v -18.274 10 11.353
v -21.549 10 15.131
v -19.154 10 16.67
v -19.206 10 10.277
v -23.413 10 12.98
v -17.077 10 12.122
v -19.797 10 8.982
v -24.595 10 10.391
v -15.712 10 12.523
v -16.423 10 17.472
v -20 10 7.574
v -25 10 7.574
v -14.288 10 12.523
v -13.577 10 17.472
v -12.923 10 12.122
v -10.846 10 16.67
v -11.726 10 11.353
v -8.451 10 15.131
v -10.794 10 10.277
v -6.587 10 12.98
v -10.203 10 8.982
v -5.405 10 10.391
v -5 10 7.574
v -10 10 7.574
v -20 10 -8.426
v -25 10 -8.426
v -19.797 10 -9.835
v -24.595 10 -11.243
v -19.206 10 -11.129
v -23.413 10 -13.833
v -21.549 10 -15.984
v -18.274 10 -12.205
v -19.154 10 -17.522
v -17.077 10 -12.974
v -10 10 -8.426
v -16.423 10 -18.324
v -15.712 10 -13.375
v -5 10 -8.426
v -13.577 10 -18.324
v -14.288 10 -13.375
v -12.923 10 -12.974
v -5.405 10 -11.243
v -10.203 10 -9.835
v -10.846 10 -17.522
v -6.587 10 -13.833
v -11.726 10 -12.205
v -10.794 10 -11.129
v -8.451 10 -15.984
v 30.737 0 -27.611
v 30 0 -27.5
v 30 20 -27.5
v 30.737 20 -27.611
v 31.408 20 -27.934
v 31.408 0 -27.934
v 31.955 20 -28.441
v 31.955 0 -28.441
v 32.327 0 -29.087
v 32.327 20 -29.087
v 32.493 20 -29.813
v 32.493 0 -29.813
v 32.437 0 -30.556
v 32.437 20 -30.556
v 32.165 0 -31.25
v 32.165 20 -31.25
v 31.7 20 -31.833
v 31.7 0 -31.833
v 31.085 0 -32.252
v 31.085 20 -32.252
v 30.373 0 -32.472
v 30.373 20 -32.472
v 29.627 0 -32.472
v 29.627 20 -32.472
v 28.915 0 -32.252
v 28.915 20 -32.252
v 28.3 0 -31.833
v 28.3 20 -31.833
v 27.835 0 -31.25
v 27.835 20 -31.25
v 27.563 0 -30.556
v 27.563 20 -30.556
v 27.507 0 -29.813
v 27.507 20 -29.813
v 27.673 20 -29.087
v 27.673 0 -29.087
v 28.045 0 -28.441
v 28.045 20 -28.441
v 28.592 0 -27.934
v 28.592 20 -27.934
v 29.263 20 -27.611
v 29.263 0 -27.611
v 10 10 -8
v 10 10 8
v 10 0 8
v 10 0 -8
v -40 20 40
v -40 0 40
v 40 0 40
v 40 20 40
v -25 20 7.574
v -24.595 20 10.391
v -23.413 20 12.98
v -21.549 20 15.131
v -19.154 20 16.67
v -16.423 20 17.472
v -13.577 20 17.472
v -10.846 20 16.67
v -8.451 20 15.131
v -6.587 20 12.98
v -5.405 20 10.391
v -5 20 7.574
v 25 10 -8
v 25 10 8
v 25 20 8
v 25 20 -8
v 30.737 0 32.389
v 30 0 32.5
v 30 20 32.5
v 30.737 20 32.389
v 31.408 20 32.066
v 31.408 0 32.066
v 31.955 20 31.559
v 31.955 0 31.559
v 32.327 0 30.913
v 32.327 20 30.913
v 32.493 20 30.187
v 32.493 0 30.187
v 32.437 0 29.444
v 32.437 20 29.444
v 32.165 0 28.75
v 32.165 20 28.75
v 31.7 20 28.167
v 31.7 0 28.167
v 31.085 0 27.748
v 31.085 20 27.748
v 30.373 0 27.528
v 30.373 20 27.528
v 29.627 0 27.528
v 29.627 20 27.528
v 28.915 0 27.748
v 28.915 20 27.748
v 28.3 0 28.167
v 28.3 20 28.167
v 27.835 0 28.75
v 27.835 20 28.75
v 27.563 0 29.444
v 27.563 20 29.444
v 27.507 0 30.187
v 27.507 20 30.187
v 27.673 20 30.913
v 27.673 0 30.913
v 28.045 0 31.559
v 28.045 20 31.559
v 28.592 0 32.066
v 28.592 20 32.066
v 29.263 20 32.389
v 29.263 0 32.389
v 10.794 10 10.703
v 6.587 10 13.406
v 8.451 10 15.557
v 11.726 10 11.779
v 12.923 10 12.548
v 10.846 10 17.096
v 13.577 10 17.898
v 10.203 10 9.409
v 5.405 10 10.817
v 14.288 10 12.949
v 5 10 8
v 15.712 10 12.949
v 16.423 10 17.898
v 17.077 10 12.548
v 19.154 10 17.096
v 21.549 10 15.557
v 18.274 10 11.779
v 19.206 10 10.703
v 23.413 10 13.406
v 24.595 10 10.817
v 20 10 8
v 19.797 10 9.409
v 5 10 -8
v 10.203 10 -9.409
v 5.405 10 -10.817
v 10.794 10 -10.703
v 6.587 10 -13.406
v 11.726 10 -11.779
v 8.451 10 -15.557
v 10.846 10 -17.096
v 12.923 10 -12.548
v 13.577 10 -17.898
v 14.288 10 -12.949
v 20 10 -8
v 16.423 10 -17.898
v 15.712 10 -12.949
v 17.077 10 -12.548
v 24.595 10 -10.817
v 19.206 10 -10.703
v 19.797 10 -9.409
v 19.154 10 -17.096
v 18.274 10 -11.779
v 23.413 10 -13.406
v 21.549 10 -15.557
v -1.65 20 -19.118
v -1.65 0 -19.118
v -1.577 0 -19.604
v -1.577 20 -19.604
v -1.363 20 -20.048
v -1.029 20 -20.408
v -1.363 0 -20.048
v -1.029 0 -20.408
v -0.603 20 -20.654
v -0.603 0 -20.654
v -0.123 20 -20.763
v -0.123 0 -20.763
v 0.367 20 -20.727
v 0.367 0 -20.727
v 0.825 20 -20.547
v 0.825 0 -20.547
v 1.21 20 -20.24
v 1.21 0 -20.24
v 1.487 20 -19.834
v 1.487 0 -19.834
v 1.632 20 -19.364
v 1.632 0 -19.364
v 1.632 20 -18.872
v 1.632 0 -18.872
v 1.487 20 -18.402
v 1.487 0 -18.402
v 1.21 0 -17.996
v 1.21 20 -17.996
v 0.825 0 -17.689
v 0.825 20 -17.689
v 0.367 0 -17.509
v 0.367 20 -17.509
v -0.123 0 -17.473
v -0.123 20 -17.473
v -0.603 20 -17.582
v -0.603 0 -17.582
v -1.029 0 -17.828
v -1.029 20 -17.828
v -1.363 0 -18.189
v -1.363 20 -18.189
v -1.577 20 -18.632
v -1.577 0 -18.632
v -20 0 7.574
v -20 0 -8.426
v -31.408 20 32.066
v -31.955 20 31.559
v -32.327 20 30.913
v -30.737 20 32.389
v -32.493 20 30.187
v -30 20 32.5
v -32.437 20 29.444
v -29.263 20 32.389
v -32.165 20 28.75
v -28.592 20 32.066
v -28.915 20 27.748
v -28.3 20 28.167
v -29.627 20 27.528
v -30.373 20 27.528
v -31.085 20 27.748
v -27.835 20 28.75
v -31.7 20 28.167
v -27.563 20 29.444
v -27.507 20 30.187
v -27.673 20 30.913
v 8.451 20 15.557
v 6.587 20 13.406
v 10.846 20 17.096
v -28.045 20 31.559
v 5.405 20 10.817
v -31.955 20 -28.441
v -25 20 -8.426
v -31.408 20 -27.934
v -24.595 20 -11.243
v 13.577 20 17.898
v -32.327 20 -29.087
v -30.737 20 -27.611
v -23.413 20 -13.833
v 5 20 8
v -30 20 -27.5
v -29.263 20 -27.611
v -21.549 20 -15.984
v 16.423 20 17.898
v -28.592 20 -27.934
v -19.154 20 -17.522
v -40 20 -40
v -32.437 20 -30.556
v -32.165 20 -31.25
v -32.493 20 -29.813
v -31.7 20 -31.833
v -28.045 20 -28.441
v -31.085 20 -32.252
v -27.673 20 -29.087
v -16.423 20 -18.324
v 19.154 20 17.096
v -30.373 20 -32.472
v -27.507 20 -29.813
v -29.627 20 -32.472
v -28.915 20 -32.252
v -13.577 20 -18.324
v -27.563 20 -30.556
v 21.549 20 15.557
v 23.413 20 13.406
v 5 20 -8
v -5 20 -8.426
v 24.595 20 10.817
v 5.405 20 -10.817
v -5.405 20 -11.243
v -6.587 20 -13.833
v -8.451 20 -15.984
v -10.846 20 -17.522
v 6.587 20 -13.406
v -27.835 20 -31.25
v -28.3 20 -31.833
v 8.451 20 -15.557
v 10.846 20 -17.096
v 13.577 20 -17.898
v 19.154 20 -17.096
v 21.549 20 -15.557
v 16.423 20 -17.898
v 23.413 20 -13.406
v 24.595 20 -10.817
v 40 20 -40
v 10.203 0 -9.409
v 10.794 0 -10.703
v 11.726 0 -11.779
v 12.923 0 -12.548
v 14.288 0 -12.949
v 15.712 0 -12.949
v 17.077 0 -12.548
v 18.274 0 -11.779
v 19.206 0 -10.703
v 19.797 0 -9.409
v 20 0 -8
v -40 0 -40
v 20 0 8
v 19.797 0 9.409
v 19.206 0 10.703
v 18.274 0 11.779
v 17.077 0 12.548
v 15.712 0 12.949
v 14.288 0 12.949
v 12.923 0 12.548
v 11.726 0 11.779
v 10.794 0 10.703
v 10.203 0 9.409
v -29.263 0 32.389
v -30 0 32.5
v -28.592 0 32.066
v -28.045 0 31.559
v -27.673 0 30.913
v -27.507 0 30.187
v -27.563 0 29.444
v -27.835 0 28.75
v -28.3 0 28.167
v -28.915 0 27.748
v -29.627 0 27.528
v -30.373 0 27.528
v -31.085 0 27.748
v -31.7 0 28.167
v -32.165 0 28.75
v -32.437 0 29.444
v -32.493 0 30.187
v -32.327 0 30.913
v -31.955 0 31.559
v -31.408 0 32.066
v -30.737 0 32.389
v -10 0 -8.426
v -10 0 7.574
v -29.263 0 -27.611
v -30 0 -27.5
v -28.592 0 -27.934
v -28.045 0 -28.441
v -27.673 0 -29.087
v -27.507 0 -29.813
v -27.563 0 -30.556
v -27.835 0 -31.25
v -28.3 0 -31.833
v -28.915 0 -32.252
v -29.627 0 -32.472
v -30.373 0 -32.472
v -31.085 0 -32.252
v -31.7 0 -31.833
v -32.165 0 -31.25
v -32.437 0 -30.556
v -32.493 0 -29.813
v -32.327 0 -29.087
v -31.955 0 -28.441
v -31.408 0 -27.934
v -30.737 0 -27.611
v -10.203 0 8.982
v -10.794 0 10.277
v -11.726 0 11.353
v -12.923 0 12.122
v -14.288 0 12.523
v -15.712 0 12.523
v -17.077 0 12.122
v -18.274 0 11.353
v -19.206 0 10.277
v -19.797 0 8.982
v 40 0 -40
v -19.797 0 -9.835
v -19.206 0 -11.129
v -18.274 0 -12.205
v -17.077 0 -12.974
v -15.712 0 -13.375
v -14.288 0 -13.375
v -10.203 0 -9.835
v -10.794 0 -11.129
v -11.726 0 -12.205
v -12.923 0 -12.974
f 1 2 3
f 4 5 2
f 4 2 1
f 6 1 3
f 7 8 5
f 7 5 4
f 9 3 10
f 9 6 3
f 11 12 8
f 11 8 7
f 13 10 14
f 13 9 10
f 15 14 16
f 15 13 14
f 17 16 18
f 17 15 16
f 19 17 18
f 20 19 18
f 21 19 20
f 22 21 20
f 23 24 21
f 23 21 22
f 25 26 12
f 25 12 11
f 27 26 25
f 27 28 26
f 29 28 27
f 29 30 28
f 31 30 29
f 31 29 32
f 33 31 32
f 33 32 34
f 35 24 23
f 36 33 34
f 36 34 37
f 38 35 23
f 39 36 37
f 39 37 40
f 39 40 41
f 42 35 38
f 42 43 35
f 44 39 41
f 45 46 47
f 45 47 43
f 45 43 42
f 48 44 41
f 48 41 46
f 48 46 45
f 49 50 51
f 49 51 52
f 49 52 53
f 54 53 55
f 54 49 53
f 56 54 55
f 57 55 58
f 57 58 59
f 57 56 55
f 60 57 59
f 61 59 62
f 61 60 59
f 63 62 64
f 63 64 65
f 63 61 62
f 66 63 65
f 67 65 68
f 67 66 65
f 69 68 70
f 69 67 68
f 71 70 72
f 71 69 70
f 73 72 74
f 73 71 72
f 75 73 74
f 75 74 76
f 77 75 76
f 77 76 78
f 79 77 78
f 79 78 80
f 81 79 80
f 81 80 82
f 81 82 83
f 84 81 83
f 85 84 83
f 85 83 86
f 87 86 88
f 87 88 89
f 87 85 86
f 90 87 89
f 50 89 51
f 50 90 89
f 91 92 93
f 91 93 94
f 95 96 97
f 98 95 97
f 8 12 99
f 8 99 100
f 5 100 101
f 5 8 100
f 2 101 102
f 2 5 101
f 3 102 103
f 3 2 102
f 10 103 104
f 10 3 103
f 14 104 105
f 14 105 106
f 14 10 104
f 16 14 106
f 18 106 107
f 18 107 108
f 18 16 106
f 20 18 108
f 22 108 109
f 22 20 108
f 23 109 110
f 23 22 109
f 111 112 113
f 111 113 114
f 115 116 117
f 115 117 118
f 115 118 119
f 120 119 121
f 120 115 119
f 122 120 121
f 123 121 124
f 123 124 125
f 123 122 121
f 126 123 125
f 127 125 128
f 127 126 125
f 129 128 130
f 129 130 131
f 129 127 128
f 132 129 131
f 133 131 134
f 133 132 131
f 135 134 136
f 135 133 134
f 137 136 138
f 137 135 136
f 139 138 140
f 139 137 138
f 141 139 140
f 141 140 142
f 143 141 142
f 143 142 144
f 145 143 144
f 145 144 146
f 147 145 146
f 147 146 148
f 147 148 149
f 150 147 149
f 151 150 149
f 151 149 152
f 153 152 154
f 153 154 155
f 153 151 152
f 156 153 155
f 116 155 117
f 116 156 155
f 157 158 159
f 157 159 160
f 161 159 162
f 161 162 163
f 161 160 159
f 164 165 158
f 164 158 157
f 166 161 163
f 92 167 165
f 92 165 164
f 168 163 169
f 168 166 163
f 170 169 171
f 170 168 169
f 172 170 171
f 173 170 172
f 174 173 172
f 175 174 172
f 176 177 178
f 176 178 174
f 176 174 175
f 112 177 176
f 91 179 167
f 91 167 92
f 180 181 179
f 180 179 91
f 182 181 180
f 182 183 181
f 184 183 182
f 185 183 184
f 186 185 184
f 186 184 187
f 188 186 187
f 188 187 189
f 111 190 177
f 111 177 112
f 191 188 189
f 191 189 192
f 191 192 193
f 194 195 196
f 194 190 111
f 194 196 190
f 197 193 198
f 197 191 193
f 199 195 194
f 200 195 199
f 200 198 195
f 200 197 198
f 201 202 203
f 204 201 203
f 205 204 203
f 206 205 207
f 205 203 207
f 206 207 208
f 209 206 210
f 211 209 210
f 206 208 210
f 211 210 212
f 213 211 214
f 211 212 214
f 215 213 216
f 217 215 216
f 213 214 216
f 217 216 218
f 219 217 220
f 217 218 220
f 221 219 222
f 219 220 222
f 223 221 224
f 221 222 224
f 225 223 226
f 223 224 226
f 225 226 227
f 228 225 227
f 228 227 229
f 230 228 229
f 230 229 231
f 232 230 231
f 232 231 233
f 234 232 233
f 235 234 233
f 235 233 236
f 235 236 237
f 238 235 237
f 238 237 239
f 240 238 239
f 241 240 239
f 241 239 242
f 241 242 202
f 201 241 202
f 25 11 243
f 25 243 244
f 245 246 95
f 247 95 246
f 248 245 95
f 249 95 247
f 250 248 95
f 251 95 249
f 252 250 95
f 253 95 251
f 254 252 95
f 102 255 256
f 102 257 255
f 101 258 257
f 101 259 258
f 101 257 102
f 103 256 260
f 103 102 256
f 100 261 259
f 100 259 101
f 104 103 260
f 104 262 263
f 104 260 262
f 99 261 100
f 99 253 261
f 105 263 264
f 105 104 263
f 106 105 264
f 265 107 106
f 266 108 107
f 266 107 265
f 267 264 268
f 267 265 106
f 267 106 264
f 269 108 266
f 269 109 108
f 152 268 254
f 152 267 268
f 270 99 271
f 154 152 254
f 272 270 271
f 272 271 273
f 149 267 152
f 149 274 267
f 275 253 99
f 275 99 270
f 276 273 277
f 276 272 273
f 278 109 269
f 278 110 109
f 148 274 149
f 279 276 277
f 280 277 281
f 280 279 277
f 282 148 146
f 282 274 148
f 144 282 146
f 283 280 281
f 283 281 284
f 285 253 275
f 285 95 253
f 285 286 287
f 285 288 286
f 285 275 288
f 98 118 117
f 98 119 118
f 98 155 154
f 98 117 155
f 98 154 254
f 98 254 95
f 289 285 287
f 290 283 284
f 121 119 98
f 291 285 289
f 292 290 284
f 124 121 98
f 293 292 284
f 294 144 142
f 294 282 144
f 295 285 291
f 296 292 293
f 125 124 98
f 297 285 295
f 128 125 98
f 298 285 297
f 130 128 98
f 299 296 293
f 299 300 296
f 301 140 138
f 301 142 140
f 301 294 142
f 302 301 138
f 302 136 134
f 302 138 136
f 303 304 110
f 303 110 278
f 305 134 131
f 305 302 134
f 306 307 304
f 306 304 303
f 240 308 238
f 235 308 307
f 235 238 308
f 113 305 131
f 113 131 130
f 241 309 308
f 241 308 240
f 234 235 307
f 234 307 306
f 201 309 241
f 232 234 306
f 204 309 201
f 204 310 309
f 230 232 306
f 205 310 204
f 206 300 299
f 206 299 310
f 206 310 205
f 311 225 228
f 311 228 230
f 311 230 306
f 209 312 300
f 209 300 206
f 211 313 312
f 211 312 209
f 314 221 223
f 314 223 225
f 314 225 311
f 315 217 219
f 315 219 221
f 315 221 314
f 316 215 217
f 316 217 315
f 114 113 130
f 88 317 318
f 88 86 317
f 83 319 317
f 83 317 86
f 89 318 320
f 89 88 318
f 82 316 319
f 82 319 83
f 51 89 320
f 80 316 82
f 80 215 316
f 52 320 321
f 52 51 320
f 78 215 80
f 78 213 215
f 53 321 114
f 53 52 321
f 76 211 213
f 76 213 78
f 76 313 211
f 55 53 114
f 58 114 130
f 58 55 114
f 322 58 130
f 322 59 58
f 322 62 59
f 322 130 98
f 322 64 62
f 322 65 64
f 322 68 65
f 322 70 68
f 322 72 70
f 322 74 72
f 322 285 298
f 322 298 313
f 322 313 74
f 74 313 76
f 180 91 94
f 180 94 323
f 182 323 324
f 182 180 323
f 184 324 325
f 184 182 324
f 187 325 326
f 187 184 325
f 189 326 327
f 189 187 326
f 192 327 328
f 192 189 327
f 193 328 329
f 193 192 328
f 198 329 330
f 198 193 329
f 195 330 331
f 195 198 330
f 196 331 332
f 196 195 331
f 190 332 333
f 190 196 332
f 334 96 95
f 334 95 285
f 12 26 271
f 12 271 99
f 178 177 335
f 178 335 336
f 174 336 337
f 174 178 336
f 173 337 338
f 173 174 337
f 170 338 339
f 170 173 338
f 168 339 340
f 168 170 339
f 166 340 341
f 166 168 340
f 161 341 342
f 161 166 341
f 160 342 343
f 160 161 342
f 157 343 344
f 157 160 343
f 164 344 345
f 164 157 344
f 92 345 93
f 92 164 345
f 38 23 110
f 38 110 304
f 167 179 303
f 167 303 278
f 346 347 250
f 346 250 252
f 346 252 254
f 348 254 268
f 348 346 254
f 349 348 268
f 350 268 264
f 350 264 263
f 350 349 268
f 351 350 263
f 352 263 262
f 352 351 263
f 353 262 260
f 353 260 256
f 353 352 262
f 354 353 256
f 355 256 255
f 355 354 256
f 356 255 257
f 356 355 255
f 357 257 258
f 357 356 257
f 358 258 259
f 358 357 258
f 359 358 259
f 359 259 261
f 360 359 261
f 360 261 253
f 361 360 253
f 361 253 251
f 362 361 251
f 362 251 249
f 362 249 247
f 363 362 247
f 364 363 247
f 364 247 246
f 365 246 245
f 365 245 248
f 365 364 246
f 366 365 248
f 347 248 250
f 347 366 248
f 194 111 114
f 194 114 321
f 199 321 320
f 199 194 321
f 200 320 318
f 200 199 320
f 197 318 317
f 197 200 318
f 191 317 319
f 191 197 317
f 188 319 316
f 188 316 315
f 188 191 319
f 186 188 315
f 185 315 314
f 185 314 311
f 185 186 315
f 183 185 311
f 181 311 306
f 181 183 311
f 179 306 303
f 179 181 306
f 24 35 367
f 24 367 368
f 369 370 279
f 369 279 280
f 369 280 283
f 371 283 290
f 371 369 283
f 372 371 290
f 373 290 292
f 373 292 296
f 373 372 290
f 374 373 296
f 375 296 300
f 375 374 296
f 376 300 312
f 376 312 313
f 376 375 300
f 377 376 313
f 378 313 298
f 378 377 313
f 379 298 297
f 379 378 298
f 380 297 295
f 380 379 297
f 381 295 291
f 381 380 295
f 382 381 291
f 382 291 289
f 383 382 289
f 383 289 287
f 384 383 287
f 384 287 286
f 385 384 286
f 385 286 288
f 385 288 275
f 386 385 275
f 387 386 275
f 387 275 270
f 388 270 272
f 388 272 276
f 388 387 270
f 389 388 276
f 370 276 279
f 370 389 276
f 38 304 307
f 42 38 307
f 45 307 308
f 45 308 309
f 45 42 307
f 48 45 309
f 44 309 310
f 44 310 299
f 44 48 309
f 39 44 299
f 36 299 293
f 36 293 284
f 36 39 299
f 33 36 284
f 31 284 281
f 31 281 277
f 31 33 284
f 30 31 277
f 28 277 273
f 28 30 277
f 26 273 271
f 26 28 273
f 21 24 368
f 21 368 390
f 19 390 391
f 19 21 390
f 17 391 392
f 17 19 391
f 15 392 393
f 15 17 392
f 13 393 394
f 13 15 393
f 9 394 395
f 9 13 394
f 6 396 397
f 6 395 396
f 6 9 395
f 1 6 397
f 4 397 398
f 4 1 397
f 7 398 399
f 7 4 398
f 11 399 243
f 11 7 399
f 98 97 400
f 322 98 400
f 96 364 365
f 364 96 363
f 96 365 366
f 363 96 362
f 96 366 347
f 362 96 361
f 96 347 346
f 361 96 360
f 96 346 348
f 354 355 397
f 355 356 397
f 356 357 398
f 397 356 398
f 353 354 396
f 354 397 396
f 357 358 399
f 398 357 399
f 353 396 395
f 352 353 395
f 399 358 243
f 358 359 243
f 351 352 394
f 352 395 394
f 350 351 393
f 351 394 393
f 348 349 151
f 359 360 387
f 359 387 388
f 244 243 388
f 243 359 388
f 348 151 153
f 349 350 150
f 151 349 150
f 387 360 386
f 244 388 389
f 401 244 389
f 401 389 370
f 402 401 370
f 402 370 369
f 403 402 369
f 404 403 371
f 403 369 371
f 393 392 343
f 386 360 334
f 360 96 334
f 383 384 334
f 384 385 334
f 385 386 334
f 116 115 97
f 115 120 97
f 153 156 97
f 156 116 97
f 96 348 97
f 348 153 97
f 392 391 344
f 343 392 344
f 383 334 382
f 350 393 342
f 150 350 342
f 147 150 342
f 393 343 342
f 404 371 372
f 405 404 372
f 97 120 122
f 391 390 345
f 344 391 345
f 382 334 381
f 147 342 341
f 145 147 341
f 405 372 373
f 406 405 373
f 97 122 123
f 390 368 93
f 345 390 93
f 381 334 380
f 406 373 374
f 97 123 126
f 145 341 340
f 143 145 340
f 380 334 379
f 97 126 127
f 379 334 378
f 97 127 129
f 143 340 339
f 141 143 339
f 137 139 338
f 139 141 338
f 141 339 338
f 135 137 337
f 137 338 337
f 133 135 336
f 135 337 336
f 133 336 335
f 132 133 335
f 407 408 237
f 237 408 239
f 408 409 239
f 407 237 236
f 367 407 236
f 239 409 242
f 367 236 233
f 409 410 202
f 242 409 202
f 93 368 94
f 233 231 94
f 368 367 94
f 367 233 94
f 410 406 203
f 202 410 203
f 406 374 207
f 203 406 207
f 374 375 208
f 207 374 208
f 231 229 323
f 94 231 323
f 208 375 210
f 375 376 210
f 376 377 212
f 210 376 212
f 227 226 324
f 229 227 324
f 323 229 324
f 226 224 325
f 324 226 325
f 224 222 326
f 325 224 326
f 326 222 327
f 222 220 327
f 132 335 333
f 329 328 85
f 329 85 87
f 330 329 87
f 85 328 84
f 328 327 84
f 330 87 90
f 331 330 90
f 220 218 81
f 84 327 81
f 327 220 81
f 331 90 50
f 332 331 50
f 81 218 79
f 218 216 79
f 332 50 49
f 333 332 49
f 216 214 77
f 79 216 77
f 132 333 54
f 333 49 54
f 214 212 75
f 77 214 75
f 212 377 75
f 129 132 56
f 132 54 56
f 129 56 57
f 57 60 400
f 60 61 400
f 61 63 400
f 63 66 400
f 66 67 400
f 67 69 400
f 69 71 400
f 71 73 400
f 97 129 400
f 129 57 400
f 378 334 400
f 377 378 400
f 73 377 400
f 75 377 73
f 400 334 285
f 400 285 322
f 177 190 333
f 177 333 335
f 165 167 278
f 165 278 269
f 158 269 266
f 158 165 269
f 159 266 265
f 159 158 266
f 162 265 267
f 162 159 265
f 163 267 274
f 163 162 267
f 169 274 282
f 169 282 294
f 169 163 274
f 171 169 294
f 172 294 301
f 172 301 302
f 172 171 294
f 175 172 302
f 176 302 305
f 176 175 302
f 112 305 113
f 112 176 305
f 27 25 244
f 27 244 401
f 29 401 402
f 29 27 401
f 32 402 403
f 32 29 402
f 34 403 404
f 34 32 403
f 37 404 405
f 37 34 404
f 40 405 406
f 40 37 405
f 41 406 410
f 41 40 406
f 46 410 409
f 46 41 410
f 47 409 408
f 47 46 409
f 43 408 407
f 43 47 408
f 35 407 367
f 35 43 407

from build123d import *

# Parameters (mm, degrees)
IZIM1_W                     = 80
IZIM1_H                     = 80
IZIM1_R                     = 2.5
Y_KSEKLIK_EKSTR_ZYON1_DEPTH = 20
KES_EKSTR_ZYON2_DEPTH       = 61
KES_EKSTR_ZYON3_START       = 10
KES_EKSTR_ZYON3_DEPTH       = 10
M4X0_7_DI_LI_DELIK1_D       = 3.3


# Read off the part's stored shape, not the designer's step: Kes-Ekstrüzyon3
with BuildPart() as part:
    # Çizim1 → Yükseklik-Ekstrüzyon1 (new body)
    with BuildSketch(Plane(origin=(0, 0, 0), x_dir=(1, 0, 0), z_dir=(0, 1, 0))):
        Rectangle(IZIM1_W, IZIM1_H)
        with Locations(Location((-30, 30, 0), (0, 0, 270))):
            Circle(IZIM1_R, mode=Mode.SUBTRACT)
        with Locations(Location((30, 30, 0), (0, 0, 270))):
            Circle(IZIM1_R, mode=Mode.SUBTRACT)
        with Locations(Location((-30, -30, 0), (0, 0, 270))):
            Circle(IZIM1_R, mode=Mode.SUBTRACT)
        with Locations(Location((30, -30, 0), (0, 0, 270))):
            Circle(IZIM1_R, mode=Mode.SUBTRACT)
    extrude(amount=Y_KSEKLIK_EKSTR_ZYON1_DEPTH)

    # Çizim2 → Kes-Ekstrüzyon2 (cut, through all)
    with BuildSketch(Plane(origin=(0, 20, 0), x_dir=(1, 0, 0), z_dir=(0, 1, 0))):
        with BuildLine():
            Line((-10, 8.426169555), (-10, -7.573830445))
            ThreePointArc((-10, -7.573830445), (-15, -12.573830445), (-20, -7.573830445))
            Line((-20, -7.573830445), (-20, 8.426169555))
            ThreePointArc((-20, 8.426169555), (-15, 13.426169555), (-10, 8.426169555))
        make_face()
        with BuildLine():
            Line((20, 8), (20, -8))
            ThreePointArc((20, -8), (15, -13), (10, -8))
            Line((10, -8), (10, 8))
            ThreePointArc((10, 8), (15, 13), (20, 8))
        make_face()
    extrude(amount=-KES_EKSTR_ZYON2_DEPTH, mode=Mode.SUBTRACT)

    # Kes-Ekstrüzyon3 outline → Kes-Ekstrüzyon3 (cut)
    # profile 1 of 2: a face of its own
    with BuildSketch(Plane(origin=(0, 0, 0), x_dir=(1, 0, 0), z_dir=(0, 1, 0)).offset(KES_EKSTR_ZYON3_START)):
        with BuildLine():
            Line((-25, 8.426169555), (-25, -7.573830445))
            ThreePointArc((-25, -7.573830445), (-15, -17.573830445), (-5, -7.573830445))
            Line((-5, -7.573830445), (-5, 8.426169555))
            ThreePointArc((-5, 8.426169555), (-15, 18.426169555), (-25, 8.426169555))
        make_face()
        with BuildLine():
            ThreePointArc((-20, 8.426169555), (-15, 13.426169555), (-10, 8.426169555))
            Line((-10, 8.426169555), (-10, -7.573830445))
            ThreePointArc((-10, -7.573830445), (-15, -12.573830445), (-20, -7.573830445))
            Line((-20, -7.573830445), (-20, 8.426169555))
        make_face(mode=Mode.SUBTRACT)
    # profile 2 of 2: a face of its own
    with BuildSketch(Plane(origin=(0, 0, 0), x_dir=(1, 0, 0), z_dir=(0, 1, 0)).offset(KES_EKSTR_ZYON3_START)):
        with BuildLine():
            Line((25, -8), (25, 8))
            ThreePointArc((25, 8), (15, 18), (5, 8))
            Line((5, 8), (5, -8))
            ThreePointArc((5, -8), (15, -18), (25, -8))
        make_face()
        with BuildLine():
            ThreePointArc((10, 8), (15, 13), (20, 8))
            Line((20, 8), (20, -8))
            ThreePointArc((20, -8), (15, -13), (10, -8))
            Line((10, -8), (10, 8))
        make_face(mode=Mode.SUBTRACT)
    extrude(amount=KES_EKSTR_ZYON3_DEPTH, mode=Mode.SUBTRACT)

    # M4x0.7 Dişli Delik1 (through all)
    with Locations(Plane(origin=(0, 20, 0), x_dir=(1, 0, 0), z_dir=(0, 1, 0))):
        with Locations((0, 19.118083018)):
            Hole(M4X0_7_DI_LI_DELIK1_D / 2)


solid = part.part
